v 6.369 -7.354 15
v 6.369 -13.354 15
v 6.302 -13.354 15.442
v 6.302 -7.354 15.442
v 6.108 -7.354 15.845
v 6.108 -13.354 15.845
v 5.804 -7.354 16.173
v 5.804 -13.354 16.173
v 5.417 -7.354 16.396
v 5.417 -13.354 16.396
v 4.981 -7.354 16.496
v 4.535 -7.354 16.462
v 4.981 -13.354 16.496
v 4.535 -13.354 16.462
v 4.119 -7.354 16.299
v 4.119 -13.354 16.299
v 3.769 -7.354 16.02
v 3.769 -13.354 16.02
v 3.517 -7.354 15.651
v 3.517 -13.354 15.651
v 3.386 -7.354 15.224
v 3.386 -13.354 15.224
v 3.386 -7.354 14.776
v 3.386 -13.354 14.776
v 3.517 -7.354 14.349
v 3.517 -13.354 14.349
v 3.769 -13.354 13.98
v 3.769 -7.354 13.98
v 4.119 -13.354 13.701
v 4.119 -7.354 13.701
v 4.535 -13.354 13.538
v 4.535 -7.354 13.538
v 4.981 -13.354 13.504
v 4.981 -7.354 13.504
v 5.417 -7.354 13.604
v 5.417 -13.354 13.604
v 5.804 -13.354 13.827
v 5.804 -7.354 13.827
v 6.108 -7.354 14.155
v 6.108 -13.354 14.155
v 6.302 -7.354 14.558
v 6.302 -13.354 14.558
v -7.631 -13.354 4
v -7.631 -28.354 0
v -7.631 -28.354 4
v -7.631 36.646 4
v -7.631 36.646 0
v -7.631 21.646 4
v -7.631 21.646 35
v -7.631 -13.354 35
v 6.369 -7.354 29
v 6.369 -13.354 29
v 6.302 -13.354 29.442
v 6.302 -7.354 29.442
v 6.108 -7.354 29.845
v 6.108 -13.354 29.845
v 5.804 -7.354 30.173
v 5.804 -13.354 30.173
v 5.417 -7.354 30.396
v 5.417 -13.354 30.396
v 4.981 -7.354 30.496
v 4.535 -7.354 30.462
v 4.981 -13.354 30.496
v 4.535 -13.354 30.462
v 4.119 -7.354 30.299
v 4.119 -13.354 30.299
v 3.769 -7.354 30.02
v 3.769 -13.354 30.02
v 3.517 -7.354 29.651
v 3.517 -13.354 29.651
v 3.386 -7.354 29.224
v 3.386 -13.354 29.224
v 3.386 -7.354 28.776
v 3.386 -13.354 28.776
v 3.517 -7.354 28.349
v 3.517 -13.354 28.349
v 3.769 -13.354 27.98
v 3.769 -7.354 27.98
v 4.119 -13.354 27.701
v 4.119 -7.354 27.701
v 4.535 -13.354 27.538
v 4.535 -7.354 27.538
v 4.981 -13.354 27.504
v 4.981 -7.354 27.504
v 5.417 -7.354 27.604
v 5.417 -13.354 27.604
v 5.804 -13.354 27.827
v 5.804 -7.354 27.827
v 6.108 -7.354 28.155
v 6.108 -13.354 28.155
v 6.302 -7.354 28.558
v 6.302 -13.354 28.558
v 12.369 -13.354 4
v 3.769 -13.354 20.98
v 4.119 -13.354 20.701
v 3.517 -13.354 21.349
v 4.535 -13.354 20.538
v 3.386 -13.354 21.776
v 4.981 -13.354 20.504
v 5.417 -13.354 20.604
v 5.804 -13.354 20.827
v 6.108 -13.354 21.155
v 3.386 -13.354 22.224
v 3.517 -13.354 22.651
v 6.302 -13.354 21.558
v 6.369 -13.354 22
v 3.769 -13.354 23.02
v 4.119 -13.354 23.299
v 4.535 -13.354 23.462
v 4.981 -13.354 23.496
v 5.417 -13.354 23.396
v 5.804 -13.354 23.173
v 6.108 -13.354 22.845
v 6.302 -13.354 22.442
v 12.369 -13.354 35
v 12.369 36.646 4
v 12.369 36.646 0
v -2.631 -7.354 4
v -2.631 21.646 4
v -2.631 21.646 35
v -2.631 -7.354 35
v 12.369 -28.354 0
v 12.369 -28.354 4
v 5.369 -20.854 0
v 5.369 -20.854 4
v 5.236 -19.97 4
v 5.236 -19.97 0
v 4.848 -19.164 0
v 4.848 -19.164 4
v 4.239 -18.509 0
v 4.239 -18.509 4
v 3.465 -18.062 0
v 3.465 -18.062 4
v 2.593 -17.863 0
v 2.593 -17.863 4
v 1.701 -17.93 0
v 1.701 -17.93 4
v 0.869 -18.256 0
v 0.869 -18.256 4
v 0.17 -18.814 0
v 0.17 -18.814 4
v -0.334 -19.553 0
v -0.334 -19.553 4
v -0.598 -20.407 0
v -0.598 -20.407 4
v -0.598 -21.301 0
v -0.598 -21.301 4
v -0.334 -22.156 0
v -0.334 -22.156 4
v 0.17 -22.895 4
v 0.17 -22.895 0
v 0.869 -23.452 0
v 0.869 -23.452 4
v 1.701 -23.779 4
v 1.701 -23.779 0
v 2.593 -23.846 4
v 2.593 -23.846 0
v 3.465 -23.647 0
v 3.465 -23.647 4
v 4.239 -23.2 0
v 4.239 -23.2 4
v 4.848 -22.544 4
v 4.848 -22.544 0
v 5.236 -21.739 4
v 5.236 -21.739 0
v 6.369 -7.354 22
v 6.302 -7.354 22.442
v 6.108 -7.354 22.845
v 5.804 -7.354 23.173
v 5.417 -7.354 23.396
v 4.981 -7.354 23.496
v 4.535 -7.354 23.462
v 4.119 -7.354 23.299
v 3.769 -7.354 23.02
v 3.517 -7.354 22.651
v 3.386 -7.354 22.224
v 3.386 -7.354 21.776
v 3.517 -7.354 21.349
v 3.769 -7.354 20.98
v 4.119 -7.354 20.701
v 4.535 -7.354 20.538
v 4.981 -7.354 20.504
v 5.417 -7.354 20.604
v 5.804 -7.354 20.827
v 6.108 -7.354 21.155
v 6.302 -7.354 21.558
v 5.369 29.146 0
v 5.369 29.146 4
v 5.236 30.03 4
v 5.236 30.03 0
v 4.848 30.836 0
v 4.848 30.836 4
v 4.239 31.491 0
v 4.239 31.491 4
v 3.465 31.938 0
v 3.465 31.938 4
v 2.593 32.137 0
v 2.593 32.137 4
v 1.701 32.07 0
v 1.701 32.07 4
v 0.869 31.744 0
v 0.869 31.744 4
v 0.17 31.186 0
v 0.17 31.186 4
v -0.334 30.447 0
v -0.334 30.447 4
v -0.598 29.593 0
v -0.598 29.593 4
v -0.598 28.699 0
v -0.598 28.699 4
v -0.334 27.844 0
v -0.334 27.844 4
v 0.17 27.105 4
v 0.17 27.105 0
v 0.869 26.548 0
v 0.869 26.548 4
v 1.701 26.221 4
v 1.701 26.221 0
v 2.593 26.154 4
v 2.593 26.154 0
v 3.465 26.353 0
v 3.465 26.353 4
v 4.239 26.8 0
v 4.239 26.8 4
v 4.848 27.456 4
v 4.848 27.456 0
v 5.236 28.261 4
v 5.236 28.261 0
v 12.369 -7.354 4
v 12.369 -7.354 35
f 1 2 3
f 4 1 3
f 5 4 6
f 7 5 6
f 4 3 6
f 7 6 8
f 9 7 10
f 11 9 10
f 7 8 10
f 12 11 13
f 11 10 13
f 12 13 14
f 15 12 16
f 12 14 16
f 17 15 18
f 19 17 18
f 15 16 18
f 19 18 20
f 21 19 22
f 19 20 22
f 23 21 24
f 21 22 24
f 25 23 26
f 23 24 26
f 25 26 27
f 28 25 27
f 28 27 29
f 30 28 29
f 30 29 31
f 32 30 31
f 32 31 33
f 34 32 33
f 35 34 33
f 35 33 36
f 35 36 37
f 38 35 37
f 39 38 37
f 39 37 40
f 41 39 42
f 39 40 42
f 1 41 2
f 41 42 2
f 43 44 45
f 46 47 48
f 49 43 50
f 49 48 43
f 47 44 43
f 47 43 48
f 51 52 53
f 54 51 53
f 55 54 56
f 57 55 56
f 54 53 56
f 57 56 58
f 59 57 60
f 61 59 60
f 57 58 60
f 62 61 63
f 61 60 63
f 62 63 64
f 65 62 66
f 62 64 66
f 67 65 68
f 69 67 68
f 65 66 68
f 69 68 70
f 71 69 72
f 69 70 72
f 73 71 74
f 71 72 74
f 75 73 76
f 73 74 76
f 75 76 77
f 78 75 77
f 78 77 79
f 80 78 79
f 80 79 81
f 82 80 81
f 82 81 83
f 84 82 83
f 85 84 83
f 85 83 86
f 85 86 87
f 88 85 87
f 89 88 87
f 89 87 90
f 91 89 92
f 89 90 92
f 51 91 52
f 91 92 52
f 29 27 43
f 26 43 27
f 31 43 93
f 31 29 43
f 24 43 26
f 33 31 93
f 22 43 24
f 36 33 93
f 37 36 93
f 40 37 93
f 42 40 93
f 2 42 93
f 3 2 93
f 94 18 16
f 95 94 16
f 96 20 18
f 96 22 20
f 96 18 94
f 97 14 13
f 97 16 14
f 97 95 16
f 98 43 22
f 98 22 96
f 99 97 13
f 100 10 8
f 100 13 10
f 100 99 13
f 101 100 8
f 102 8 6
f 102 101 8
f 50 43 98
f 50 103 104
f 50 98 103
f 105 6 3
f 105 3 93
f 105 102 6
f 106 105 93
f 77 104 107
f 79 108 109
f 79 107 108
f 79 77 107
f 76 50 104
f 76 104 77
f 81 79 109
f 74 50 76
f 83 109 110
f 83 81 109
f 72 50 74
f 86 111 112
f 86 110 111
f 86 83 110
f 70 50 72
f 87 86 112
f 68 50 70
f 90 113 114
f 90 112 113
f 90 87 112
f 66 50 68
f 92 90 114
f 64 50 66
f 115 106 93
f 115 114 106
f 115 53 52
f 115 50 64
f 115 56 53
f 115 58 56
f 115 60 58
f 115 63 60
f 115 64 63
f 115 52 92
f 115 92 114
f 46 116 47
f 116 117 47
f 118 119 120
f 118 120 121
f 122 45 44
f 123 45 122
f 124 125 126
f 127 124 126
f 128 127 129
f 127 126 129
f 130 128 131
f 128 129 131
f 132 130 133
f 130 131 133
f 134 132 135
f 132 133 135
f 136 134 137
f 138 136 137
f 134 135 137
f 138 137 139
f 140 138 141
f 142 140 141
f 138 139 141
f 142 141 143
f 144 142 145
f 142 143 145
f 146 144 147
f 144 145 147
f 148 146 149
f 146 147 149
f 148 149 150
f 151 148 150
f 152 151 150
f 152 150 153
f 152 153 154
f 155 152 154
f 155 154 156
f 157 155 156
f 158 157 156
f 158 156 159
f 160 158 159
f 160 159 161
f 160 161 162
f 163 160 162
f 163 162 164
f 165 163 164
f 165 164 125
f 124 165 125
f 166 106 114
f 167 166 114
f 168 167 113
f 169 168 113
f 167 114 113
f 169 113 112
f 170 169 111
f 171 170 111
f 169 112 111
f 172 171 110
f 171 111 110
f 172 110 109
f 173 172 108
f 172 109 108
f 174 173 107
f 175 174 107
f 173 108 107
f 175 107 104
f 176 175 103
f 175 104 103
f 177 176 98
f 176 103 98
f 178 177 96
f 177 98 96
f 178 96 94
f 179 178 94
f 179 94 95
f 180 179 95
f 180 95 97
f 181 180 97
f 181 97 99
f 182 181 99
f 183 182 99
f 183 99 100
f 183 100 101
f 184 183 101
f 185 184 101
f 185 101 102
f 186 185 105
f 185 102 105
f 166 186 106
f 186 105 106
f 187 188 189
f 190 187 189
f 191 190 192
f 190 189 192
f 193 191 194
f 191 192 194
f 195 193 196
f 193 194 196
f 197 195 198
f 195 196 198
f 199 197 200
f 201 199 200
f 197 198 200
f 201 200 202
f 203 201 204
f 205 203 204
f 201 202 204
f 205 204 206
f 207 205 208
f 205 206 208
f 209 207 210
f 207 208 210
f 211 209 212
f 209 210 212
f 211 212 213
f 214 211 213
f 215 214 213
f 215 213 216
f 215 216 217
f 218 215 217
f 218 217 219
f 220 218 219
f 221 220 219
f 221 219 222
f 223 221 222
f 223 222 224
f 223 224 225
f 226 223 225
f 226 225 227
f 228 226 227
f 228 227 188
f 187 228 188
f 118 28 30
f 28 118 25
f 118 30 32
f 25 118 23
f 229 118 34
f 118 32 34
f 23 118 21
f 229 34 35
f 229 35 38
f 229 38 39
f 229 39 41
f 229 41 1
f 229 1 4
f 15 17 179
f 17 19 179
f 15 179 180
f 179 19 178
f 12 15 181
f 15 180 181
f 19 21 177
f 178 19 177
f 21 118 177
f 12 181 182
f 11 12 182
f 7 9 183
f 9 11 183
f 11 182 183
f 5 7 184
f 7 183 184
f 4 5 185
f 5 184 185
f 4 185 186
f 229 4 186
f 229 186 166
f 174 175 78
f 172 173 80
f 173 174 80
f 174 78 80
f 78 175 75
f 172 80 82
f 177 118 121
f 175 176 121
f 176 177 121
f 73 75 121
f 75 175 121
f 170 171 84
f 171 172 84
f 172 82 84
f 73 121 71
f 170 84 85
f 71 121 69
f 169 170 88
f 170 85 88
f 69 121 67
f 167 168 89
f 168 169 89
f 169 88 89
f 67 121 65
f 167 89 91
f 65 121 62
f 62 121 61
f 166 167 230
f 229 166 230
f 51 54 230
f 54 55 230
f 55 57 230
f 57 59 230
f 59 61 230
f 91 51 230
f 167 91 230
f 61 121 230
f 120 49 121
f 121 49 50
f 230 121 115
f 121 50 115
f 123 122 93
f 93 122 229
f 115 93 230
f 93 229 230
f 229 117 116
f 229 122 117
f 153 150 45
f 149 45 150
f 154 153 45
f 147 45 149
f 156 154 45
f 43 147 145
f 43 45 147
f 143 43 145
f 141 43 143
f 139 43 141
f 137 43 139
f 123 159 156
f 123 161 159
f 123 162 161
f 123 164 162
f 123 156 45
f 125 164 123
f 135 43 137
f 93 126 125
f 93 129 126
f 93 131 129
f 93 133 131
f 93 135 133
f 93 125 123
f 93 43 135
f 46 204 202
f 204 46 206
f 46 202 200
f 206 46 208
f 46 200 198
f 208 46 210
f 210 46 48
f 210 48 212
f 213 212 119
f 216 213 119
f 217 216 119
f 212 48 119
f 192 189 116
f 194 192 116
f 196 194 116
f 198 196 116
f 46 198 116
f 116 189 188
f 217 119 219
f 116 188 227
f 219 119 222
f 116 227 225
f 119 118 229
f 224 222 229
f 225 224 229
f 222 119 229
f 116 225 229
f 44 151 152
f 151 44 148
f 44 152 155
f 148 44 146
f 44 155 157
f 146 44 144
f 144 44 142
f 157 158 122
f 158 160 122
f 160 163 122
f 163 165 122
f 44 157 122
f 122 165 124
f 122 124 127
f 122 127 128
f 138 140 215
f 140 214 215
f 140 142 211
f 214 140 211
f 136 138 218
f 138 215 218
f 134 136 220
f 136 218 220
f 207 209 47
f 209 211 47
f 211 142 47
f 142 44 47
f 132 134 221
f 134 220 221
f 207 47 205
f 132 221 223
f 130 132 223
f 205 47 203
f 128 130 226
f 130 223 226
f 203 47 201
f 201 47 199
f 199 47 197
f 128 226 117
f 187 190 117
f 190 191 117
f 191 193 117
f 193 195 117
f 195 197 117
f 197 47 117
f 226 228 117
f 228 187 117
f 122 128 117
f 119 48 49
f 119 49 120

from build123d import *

# Parameters (mm, degrees)
BOSS_EXTRUDE1_DEPTH = 35
SKETCH3_R           = 1.5
CUT_EXTRUDE1_DEPTH  = 15
LPATTERN1_COUNT     = 3
LPATTERN1_PITCH     = 7
SKETCH6_W           = 15
SKETCH6_H           = 35
SKETCH6_R           = 1.5
BOSS_EXTRUDE4_DEPTH = 6
SKETCH7_W           = 15
SKETCH7_H           = 35
CUT_EXTRUDE2_DEPTH  = 8
SKETCH2_W           = 4
SKETCH2_H           = 35
BOSS_EXTRUDE5_DEPTH = 20
BOSS_EXTRUDE6_DEPTH = 15
SKETCH10_W          = 20
SKETCH10_H          = 4
BOSS_EXTRUDE7_DEPTH = 15
SKETCH11_R          = 3
CUT_EXTRUDE3_DEPTH  = 15


with BuildPart() as part:
    # Sketch1 → Boss-Extrude1 (new body)
    with BuildSketch(Plane.XY):
        Polygon((12.368951074, 15.64566438), (-2.631048926, 15.64566438), (-2.631048926, -13.35433562), (-7.631048926, -13.35433562), (-7.631048926, 21.64566438), (12.368951074, 21.64566438), align=None)
    extrude(amount=BOSS_EXTRUDE1_DEPTH)

    # Sketch3 → Cut-Extrude1 (cut)
    with BuildSketch(Plane.XZ.offset(-15.64566438)):
        with Locations((4.868951074, 29)):
            Circle(SKETCH3_R)
    cut_extrude1 = extrude(amount=-CUT_EXTRUDE1_DEPTH, mode=Mode.SUBTRACT)

    # LPattern1: Cut-Extrude1 ×3
    with Locations(*[(0, 0, -i * LPATTERN1_PITCH) for i in range(1, LPATTERN1_COUNT)]):
        add(cut_extrude1, mode=Mode.SUBTRACT)

    # Sketch6 → Boss-Extrude4 (add)
    with BuildSketch(Plane.XZ.offset(13.35433562)):
        with Locations((4.868951074, 17.5)):
            Rectangle(SKETCH6_W, SKETCH6_H)
        with Locations((4.868951074, 15)):
            Circle(SKETCH6_R, mode=Mode.SUBTRACT)
        with Locations((4.868951074, 29)):
            Circle(SKETCH6_R, mode=Mode.SUBTRACT)
        with Locations((4.868951074, 22)):
            Circle(SKETCH6_R, mode=Mode.SUBTRACT)
    extrude(amount=-BOSS_EXTRUDE4_DEPTH)

    # Sketch7 → Cut-Extrude2 (cut)
    with BuildSketch(Plane.XZ.offset(-15.64566438)):
        with Locations((4.868951074, 17.5)):
            Rectangle(SKETCH7_W, SKETCH7_H)
    extrude(amount=-CUT_EXTRUDE2_DEPTH, mode=Mode.SUBTRACT)

    # Sketch2 → Boss-Extrude5 (add)
    with BuildSketch(Plane.ZY.offset(7.631048926)):
        with Locations((2, 4.14566438)):
            Rectangle(SKETCH2_W, SKETCH2_H)
    extrude(amount=-BOSS_EXTRUDE5_DEPTH)

    # Sketch9 → Boss-Extrude6 (add)
    with BuildSketch(Plane(origin=(0, 21.64566438, 0), x_dir=(1, 0, 0), z_dir=(0, 1, 0))):
        Polygon((-2.631048926, -4), (-7.631048926, -4), (-7.631048926, 0), (12.368951074, 0), (12.368951074, -4), align=None)
    extrude(amount=BOSS_EXTRUDE6_DEPTH)

    # Sketch10 → Boss-Extrude7 (add)
    with BuildSketch(Plane.XZ.offset(13.35433562)):
        with Locations((2.368951074, 2)):
            Rectangle(SKETCH10_W, SKETCH10_H)
    extrude(amount=BOSS_EXTRUDE7_DEPTH)

    # Sketch11 → Cut-Extrude3 (cut)
    with BuildSketch(Plane.XY.offset(4)):
        with Locations((2.368951074, -20.85433562)):
            Circle(SKETCH11_R)
        with Locations((2.368951074, 29.14566438)):
            Circle(SKETCH11_R)
    extrude(amount=-CUT_EXTRUDE3_DEPTH, mode=Mode.SUBTRACT)


solid = part.part
